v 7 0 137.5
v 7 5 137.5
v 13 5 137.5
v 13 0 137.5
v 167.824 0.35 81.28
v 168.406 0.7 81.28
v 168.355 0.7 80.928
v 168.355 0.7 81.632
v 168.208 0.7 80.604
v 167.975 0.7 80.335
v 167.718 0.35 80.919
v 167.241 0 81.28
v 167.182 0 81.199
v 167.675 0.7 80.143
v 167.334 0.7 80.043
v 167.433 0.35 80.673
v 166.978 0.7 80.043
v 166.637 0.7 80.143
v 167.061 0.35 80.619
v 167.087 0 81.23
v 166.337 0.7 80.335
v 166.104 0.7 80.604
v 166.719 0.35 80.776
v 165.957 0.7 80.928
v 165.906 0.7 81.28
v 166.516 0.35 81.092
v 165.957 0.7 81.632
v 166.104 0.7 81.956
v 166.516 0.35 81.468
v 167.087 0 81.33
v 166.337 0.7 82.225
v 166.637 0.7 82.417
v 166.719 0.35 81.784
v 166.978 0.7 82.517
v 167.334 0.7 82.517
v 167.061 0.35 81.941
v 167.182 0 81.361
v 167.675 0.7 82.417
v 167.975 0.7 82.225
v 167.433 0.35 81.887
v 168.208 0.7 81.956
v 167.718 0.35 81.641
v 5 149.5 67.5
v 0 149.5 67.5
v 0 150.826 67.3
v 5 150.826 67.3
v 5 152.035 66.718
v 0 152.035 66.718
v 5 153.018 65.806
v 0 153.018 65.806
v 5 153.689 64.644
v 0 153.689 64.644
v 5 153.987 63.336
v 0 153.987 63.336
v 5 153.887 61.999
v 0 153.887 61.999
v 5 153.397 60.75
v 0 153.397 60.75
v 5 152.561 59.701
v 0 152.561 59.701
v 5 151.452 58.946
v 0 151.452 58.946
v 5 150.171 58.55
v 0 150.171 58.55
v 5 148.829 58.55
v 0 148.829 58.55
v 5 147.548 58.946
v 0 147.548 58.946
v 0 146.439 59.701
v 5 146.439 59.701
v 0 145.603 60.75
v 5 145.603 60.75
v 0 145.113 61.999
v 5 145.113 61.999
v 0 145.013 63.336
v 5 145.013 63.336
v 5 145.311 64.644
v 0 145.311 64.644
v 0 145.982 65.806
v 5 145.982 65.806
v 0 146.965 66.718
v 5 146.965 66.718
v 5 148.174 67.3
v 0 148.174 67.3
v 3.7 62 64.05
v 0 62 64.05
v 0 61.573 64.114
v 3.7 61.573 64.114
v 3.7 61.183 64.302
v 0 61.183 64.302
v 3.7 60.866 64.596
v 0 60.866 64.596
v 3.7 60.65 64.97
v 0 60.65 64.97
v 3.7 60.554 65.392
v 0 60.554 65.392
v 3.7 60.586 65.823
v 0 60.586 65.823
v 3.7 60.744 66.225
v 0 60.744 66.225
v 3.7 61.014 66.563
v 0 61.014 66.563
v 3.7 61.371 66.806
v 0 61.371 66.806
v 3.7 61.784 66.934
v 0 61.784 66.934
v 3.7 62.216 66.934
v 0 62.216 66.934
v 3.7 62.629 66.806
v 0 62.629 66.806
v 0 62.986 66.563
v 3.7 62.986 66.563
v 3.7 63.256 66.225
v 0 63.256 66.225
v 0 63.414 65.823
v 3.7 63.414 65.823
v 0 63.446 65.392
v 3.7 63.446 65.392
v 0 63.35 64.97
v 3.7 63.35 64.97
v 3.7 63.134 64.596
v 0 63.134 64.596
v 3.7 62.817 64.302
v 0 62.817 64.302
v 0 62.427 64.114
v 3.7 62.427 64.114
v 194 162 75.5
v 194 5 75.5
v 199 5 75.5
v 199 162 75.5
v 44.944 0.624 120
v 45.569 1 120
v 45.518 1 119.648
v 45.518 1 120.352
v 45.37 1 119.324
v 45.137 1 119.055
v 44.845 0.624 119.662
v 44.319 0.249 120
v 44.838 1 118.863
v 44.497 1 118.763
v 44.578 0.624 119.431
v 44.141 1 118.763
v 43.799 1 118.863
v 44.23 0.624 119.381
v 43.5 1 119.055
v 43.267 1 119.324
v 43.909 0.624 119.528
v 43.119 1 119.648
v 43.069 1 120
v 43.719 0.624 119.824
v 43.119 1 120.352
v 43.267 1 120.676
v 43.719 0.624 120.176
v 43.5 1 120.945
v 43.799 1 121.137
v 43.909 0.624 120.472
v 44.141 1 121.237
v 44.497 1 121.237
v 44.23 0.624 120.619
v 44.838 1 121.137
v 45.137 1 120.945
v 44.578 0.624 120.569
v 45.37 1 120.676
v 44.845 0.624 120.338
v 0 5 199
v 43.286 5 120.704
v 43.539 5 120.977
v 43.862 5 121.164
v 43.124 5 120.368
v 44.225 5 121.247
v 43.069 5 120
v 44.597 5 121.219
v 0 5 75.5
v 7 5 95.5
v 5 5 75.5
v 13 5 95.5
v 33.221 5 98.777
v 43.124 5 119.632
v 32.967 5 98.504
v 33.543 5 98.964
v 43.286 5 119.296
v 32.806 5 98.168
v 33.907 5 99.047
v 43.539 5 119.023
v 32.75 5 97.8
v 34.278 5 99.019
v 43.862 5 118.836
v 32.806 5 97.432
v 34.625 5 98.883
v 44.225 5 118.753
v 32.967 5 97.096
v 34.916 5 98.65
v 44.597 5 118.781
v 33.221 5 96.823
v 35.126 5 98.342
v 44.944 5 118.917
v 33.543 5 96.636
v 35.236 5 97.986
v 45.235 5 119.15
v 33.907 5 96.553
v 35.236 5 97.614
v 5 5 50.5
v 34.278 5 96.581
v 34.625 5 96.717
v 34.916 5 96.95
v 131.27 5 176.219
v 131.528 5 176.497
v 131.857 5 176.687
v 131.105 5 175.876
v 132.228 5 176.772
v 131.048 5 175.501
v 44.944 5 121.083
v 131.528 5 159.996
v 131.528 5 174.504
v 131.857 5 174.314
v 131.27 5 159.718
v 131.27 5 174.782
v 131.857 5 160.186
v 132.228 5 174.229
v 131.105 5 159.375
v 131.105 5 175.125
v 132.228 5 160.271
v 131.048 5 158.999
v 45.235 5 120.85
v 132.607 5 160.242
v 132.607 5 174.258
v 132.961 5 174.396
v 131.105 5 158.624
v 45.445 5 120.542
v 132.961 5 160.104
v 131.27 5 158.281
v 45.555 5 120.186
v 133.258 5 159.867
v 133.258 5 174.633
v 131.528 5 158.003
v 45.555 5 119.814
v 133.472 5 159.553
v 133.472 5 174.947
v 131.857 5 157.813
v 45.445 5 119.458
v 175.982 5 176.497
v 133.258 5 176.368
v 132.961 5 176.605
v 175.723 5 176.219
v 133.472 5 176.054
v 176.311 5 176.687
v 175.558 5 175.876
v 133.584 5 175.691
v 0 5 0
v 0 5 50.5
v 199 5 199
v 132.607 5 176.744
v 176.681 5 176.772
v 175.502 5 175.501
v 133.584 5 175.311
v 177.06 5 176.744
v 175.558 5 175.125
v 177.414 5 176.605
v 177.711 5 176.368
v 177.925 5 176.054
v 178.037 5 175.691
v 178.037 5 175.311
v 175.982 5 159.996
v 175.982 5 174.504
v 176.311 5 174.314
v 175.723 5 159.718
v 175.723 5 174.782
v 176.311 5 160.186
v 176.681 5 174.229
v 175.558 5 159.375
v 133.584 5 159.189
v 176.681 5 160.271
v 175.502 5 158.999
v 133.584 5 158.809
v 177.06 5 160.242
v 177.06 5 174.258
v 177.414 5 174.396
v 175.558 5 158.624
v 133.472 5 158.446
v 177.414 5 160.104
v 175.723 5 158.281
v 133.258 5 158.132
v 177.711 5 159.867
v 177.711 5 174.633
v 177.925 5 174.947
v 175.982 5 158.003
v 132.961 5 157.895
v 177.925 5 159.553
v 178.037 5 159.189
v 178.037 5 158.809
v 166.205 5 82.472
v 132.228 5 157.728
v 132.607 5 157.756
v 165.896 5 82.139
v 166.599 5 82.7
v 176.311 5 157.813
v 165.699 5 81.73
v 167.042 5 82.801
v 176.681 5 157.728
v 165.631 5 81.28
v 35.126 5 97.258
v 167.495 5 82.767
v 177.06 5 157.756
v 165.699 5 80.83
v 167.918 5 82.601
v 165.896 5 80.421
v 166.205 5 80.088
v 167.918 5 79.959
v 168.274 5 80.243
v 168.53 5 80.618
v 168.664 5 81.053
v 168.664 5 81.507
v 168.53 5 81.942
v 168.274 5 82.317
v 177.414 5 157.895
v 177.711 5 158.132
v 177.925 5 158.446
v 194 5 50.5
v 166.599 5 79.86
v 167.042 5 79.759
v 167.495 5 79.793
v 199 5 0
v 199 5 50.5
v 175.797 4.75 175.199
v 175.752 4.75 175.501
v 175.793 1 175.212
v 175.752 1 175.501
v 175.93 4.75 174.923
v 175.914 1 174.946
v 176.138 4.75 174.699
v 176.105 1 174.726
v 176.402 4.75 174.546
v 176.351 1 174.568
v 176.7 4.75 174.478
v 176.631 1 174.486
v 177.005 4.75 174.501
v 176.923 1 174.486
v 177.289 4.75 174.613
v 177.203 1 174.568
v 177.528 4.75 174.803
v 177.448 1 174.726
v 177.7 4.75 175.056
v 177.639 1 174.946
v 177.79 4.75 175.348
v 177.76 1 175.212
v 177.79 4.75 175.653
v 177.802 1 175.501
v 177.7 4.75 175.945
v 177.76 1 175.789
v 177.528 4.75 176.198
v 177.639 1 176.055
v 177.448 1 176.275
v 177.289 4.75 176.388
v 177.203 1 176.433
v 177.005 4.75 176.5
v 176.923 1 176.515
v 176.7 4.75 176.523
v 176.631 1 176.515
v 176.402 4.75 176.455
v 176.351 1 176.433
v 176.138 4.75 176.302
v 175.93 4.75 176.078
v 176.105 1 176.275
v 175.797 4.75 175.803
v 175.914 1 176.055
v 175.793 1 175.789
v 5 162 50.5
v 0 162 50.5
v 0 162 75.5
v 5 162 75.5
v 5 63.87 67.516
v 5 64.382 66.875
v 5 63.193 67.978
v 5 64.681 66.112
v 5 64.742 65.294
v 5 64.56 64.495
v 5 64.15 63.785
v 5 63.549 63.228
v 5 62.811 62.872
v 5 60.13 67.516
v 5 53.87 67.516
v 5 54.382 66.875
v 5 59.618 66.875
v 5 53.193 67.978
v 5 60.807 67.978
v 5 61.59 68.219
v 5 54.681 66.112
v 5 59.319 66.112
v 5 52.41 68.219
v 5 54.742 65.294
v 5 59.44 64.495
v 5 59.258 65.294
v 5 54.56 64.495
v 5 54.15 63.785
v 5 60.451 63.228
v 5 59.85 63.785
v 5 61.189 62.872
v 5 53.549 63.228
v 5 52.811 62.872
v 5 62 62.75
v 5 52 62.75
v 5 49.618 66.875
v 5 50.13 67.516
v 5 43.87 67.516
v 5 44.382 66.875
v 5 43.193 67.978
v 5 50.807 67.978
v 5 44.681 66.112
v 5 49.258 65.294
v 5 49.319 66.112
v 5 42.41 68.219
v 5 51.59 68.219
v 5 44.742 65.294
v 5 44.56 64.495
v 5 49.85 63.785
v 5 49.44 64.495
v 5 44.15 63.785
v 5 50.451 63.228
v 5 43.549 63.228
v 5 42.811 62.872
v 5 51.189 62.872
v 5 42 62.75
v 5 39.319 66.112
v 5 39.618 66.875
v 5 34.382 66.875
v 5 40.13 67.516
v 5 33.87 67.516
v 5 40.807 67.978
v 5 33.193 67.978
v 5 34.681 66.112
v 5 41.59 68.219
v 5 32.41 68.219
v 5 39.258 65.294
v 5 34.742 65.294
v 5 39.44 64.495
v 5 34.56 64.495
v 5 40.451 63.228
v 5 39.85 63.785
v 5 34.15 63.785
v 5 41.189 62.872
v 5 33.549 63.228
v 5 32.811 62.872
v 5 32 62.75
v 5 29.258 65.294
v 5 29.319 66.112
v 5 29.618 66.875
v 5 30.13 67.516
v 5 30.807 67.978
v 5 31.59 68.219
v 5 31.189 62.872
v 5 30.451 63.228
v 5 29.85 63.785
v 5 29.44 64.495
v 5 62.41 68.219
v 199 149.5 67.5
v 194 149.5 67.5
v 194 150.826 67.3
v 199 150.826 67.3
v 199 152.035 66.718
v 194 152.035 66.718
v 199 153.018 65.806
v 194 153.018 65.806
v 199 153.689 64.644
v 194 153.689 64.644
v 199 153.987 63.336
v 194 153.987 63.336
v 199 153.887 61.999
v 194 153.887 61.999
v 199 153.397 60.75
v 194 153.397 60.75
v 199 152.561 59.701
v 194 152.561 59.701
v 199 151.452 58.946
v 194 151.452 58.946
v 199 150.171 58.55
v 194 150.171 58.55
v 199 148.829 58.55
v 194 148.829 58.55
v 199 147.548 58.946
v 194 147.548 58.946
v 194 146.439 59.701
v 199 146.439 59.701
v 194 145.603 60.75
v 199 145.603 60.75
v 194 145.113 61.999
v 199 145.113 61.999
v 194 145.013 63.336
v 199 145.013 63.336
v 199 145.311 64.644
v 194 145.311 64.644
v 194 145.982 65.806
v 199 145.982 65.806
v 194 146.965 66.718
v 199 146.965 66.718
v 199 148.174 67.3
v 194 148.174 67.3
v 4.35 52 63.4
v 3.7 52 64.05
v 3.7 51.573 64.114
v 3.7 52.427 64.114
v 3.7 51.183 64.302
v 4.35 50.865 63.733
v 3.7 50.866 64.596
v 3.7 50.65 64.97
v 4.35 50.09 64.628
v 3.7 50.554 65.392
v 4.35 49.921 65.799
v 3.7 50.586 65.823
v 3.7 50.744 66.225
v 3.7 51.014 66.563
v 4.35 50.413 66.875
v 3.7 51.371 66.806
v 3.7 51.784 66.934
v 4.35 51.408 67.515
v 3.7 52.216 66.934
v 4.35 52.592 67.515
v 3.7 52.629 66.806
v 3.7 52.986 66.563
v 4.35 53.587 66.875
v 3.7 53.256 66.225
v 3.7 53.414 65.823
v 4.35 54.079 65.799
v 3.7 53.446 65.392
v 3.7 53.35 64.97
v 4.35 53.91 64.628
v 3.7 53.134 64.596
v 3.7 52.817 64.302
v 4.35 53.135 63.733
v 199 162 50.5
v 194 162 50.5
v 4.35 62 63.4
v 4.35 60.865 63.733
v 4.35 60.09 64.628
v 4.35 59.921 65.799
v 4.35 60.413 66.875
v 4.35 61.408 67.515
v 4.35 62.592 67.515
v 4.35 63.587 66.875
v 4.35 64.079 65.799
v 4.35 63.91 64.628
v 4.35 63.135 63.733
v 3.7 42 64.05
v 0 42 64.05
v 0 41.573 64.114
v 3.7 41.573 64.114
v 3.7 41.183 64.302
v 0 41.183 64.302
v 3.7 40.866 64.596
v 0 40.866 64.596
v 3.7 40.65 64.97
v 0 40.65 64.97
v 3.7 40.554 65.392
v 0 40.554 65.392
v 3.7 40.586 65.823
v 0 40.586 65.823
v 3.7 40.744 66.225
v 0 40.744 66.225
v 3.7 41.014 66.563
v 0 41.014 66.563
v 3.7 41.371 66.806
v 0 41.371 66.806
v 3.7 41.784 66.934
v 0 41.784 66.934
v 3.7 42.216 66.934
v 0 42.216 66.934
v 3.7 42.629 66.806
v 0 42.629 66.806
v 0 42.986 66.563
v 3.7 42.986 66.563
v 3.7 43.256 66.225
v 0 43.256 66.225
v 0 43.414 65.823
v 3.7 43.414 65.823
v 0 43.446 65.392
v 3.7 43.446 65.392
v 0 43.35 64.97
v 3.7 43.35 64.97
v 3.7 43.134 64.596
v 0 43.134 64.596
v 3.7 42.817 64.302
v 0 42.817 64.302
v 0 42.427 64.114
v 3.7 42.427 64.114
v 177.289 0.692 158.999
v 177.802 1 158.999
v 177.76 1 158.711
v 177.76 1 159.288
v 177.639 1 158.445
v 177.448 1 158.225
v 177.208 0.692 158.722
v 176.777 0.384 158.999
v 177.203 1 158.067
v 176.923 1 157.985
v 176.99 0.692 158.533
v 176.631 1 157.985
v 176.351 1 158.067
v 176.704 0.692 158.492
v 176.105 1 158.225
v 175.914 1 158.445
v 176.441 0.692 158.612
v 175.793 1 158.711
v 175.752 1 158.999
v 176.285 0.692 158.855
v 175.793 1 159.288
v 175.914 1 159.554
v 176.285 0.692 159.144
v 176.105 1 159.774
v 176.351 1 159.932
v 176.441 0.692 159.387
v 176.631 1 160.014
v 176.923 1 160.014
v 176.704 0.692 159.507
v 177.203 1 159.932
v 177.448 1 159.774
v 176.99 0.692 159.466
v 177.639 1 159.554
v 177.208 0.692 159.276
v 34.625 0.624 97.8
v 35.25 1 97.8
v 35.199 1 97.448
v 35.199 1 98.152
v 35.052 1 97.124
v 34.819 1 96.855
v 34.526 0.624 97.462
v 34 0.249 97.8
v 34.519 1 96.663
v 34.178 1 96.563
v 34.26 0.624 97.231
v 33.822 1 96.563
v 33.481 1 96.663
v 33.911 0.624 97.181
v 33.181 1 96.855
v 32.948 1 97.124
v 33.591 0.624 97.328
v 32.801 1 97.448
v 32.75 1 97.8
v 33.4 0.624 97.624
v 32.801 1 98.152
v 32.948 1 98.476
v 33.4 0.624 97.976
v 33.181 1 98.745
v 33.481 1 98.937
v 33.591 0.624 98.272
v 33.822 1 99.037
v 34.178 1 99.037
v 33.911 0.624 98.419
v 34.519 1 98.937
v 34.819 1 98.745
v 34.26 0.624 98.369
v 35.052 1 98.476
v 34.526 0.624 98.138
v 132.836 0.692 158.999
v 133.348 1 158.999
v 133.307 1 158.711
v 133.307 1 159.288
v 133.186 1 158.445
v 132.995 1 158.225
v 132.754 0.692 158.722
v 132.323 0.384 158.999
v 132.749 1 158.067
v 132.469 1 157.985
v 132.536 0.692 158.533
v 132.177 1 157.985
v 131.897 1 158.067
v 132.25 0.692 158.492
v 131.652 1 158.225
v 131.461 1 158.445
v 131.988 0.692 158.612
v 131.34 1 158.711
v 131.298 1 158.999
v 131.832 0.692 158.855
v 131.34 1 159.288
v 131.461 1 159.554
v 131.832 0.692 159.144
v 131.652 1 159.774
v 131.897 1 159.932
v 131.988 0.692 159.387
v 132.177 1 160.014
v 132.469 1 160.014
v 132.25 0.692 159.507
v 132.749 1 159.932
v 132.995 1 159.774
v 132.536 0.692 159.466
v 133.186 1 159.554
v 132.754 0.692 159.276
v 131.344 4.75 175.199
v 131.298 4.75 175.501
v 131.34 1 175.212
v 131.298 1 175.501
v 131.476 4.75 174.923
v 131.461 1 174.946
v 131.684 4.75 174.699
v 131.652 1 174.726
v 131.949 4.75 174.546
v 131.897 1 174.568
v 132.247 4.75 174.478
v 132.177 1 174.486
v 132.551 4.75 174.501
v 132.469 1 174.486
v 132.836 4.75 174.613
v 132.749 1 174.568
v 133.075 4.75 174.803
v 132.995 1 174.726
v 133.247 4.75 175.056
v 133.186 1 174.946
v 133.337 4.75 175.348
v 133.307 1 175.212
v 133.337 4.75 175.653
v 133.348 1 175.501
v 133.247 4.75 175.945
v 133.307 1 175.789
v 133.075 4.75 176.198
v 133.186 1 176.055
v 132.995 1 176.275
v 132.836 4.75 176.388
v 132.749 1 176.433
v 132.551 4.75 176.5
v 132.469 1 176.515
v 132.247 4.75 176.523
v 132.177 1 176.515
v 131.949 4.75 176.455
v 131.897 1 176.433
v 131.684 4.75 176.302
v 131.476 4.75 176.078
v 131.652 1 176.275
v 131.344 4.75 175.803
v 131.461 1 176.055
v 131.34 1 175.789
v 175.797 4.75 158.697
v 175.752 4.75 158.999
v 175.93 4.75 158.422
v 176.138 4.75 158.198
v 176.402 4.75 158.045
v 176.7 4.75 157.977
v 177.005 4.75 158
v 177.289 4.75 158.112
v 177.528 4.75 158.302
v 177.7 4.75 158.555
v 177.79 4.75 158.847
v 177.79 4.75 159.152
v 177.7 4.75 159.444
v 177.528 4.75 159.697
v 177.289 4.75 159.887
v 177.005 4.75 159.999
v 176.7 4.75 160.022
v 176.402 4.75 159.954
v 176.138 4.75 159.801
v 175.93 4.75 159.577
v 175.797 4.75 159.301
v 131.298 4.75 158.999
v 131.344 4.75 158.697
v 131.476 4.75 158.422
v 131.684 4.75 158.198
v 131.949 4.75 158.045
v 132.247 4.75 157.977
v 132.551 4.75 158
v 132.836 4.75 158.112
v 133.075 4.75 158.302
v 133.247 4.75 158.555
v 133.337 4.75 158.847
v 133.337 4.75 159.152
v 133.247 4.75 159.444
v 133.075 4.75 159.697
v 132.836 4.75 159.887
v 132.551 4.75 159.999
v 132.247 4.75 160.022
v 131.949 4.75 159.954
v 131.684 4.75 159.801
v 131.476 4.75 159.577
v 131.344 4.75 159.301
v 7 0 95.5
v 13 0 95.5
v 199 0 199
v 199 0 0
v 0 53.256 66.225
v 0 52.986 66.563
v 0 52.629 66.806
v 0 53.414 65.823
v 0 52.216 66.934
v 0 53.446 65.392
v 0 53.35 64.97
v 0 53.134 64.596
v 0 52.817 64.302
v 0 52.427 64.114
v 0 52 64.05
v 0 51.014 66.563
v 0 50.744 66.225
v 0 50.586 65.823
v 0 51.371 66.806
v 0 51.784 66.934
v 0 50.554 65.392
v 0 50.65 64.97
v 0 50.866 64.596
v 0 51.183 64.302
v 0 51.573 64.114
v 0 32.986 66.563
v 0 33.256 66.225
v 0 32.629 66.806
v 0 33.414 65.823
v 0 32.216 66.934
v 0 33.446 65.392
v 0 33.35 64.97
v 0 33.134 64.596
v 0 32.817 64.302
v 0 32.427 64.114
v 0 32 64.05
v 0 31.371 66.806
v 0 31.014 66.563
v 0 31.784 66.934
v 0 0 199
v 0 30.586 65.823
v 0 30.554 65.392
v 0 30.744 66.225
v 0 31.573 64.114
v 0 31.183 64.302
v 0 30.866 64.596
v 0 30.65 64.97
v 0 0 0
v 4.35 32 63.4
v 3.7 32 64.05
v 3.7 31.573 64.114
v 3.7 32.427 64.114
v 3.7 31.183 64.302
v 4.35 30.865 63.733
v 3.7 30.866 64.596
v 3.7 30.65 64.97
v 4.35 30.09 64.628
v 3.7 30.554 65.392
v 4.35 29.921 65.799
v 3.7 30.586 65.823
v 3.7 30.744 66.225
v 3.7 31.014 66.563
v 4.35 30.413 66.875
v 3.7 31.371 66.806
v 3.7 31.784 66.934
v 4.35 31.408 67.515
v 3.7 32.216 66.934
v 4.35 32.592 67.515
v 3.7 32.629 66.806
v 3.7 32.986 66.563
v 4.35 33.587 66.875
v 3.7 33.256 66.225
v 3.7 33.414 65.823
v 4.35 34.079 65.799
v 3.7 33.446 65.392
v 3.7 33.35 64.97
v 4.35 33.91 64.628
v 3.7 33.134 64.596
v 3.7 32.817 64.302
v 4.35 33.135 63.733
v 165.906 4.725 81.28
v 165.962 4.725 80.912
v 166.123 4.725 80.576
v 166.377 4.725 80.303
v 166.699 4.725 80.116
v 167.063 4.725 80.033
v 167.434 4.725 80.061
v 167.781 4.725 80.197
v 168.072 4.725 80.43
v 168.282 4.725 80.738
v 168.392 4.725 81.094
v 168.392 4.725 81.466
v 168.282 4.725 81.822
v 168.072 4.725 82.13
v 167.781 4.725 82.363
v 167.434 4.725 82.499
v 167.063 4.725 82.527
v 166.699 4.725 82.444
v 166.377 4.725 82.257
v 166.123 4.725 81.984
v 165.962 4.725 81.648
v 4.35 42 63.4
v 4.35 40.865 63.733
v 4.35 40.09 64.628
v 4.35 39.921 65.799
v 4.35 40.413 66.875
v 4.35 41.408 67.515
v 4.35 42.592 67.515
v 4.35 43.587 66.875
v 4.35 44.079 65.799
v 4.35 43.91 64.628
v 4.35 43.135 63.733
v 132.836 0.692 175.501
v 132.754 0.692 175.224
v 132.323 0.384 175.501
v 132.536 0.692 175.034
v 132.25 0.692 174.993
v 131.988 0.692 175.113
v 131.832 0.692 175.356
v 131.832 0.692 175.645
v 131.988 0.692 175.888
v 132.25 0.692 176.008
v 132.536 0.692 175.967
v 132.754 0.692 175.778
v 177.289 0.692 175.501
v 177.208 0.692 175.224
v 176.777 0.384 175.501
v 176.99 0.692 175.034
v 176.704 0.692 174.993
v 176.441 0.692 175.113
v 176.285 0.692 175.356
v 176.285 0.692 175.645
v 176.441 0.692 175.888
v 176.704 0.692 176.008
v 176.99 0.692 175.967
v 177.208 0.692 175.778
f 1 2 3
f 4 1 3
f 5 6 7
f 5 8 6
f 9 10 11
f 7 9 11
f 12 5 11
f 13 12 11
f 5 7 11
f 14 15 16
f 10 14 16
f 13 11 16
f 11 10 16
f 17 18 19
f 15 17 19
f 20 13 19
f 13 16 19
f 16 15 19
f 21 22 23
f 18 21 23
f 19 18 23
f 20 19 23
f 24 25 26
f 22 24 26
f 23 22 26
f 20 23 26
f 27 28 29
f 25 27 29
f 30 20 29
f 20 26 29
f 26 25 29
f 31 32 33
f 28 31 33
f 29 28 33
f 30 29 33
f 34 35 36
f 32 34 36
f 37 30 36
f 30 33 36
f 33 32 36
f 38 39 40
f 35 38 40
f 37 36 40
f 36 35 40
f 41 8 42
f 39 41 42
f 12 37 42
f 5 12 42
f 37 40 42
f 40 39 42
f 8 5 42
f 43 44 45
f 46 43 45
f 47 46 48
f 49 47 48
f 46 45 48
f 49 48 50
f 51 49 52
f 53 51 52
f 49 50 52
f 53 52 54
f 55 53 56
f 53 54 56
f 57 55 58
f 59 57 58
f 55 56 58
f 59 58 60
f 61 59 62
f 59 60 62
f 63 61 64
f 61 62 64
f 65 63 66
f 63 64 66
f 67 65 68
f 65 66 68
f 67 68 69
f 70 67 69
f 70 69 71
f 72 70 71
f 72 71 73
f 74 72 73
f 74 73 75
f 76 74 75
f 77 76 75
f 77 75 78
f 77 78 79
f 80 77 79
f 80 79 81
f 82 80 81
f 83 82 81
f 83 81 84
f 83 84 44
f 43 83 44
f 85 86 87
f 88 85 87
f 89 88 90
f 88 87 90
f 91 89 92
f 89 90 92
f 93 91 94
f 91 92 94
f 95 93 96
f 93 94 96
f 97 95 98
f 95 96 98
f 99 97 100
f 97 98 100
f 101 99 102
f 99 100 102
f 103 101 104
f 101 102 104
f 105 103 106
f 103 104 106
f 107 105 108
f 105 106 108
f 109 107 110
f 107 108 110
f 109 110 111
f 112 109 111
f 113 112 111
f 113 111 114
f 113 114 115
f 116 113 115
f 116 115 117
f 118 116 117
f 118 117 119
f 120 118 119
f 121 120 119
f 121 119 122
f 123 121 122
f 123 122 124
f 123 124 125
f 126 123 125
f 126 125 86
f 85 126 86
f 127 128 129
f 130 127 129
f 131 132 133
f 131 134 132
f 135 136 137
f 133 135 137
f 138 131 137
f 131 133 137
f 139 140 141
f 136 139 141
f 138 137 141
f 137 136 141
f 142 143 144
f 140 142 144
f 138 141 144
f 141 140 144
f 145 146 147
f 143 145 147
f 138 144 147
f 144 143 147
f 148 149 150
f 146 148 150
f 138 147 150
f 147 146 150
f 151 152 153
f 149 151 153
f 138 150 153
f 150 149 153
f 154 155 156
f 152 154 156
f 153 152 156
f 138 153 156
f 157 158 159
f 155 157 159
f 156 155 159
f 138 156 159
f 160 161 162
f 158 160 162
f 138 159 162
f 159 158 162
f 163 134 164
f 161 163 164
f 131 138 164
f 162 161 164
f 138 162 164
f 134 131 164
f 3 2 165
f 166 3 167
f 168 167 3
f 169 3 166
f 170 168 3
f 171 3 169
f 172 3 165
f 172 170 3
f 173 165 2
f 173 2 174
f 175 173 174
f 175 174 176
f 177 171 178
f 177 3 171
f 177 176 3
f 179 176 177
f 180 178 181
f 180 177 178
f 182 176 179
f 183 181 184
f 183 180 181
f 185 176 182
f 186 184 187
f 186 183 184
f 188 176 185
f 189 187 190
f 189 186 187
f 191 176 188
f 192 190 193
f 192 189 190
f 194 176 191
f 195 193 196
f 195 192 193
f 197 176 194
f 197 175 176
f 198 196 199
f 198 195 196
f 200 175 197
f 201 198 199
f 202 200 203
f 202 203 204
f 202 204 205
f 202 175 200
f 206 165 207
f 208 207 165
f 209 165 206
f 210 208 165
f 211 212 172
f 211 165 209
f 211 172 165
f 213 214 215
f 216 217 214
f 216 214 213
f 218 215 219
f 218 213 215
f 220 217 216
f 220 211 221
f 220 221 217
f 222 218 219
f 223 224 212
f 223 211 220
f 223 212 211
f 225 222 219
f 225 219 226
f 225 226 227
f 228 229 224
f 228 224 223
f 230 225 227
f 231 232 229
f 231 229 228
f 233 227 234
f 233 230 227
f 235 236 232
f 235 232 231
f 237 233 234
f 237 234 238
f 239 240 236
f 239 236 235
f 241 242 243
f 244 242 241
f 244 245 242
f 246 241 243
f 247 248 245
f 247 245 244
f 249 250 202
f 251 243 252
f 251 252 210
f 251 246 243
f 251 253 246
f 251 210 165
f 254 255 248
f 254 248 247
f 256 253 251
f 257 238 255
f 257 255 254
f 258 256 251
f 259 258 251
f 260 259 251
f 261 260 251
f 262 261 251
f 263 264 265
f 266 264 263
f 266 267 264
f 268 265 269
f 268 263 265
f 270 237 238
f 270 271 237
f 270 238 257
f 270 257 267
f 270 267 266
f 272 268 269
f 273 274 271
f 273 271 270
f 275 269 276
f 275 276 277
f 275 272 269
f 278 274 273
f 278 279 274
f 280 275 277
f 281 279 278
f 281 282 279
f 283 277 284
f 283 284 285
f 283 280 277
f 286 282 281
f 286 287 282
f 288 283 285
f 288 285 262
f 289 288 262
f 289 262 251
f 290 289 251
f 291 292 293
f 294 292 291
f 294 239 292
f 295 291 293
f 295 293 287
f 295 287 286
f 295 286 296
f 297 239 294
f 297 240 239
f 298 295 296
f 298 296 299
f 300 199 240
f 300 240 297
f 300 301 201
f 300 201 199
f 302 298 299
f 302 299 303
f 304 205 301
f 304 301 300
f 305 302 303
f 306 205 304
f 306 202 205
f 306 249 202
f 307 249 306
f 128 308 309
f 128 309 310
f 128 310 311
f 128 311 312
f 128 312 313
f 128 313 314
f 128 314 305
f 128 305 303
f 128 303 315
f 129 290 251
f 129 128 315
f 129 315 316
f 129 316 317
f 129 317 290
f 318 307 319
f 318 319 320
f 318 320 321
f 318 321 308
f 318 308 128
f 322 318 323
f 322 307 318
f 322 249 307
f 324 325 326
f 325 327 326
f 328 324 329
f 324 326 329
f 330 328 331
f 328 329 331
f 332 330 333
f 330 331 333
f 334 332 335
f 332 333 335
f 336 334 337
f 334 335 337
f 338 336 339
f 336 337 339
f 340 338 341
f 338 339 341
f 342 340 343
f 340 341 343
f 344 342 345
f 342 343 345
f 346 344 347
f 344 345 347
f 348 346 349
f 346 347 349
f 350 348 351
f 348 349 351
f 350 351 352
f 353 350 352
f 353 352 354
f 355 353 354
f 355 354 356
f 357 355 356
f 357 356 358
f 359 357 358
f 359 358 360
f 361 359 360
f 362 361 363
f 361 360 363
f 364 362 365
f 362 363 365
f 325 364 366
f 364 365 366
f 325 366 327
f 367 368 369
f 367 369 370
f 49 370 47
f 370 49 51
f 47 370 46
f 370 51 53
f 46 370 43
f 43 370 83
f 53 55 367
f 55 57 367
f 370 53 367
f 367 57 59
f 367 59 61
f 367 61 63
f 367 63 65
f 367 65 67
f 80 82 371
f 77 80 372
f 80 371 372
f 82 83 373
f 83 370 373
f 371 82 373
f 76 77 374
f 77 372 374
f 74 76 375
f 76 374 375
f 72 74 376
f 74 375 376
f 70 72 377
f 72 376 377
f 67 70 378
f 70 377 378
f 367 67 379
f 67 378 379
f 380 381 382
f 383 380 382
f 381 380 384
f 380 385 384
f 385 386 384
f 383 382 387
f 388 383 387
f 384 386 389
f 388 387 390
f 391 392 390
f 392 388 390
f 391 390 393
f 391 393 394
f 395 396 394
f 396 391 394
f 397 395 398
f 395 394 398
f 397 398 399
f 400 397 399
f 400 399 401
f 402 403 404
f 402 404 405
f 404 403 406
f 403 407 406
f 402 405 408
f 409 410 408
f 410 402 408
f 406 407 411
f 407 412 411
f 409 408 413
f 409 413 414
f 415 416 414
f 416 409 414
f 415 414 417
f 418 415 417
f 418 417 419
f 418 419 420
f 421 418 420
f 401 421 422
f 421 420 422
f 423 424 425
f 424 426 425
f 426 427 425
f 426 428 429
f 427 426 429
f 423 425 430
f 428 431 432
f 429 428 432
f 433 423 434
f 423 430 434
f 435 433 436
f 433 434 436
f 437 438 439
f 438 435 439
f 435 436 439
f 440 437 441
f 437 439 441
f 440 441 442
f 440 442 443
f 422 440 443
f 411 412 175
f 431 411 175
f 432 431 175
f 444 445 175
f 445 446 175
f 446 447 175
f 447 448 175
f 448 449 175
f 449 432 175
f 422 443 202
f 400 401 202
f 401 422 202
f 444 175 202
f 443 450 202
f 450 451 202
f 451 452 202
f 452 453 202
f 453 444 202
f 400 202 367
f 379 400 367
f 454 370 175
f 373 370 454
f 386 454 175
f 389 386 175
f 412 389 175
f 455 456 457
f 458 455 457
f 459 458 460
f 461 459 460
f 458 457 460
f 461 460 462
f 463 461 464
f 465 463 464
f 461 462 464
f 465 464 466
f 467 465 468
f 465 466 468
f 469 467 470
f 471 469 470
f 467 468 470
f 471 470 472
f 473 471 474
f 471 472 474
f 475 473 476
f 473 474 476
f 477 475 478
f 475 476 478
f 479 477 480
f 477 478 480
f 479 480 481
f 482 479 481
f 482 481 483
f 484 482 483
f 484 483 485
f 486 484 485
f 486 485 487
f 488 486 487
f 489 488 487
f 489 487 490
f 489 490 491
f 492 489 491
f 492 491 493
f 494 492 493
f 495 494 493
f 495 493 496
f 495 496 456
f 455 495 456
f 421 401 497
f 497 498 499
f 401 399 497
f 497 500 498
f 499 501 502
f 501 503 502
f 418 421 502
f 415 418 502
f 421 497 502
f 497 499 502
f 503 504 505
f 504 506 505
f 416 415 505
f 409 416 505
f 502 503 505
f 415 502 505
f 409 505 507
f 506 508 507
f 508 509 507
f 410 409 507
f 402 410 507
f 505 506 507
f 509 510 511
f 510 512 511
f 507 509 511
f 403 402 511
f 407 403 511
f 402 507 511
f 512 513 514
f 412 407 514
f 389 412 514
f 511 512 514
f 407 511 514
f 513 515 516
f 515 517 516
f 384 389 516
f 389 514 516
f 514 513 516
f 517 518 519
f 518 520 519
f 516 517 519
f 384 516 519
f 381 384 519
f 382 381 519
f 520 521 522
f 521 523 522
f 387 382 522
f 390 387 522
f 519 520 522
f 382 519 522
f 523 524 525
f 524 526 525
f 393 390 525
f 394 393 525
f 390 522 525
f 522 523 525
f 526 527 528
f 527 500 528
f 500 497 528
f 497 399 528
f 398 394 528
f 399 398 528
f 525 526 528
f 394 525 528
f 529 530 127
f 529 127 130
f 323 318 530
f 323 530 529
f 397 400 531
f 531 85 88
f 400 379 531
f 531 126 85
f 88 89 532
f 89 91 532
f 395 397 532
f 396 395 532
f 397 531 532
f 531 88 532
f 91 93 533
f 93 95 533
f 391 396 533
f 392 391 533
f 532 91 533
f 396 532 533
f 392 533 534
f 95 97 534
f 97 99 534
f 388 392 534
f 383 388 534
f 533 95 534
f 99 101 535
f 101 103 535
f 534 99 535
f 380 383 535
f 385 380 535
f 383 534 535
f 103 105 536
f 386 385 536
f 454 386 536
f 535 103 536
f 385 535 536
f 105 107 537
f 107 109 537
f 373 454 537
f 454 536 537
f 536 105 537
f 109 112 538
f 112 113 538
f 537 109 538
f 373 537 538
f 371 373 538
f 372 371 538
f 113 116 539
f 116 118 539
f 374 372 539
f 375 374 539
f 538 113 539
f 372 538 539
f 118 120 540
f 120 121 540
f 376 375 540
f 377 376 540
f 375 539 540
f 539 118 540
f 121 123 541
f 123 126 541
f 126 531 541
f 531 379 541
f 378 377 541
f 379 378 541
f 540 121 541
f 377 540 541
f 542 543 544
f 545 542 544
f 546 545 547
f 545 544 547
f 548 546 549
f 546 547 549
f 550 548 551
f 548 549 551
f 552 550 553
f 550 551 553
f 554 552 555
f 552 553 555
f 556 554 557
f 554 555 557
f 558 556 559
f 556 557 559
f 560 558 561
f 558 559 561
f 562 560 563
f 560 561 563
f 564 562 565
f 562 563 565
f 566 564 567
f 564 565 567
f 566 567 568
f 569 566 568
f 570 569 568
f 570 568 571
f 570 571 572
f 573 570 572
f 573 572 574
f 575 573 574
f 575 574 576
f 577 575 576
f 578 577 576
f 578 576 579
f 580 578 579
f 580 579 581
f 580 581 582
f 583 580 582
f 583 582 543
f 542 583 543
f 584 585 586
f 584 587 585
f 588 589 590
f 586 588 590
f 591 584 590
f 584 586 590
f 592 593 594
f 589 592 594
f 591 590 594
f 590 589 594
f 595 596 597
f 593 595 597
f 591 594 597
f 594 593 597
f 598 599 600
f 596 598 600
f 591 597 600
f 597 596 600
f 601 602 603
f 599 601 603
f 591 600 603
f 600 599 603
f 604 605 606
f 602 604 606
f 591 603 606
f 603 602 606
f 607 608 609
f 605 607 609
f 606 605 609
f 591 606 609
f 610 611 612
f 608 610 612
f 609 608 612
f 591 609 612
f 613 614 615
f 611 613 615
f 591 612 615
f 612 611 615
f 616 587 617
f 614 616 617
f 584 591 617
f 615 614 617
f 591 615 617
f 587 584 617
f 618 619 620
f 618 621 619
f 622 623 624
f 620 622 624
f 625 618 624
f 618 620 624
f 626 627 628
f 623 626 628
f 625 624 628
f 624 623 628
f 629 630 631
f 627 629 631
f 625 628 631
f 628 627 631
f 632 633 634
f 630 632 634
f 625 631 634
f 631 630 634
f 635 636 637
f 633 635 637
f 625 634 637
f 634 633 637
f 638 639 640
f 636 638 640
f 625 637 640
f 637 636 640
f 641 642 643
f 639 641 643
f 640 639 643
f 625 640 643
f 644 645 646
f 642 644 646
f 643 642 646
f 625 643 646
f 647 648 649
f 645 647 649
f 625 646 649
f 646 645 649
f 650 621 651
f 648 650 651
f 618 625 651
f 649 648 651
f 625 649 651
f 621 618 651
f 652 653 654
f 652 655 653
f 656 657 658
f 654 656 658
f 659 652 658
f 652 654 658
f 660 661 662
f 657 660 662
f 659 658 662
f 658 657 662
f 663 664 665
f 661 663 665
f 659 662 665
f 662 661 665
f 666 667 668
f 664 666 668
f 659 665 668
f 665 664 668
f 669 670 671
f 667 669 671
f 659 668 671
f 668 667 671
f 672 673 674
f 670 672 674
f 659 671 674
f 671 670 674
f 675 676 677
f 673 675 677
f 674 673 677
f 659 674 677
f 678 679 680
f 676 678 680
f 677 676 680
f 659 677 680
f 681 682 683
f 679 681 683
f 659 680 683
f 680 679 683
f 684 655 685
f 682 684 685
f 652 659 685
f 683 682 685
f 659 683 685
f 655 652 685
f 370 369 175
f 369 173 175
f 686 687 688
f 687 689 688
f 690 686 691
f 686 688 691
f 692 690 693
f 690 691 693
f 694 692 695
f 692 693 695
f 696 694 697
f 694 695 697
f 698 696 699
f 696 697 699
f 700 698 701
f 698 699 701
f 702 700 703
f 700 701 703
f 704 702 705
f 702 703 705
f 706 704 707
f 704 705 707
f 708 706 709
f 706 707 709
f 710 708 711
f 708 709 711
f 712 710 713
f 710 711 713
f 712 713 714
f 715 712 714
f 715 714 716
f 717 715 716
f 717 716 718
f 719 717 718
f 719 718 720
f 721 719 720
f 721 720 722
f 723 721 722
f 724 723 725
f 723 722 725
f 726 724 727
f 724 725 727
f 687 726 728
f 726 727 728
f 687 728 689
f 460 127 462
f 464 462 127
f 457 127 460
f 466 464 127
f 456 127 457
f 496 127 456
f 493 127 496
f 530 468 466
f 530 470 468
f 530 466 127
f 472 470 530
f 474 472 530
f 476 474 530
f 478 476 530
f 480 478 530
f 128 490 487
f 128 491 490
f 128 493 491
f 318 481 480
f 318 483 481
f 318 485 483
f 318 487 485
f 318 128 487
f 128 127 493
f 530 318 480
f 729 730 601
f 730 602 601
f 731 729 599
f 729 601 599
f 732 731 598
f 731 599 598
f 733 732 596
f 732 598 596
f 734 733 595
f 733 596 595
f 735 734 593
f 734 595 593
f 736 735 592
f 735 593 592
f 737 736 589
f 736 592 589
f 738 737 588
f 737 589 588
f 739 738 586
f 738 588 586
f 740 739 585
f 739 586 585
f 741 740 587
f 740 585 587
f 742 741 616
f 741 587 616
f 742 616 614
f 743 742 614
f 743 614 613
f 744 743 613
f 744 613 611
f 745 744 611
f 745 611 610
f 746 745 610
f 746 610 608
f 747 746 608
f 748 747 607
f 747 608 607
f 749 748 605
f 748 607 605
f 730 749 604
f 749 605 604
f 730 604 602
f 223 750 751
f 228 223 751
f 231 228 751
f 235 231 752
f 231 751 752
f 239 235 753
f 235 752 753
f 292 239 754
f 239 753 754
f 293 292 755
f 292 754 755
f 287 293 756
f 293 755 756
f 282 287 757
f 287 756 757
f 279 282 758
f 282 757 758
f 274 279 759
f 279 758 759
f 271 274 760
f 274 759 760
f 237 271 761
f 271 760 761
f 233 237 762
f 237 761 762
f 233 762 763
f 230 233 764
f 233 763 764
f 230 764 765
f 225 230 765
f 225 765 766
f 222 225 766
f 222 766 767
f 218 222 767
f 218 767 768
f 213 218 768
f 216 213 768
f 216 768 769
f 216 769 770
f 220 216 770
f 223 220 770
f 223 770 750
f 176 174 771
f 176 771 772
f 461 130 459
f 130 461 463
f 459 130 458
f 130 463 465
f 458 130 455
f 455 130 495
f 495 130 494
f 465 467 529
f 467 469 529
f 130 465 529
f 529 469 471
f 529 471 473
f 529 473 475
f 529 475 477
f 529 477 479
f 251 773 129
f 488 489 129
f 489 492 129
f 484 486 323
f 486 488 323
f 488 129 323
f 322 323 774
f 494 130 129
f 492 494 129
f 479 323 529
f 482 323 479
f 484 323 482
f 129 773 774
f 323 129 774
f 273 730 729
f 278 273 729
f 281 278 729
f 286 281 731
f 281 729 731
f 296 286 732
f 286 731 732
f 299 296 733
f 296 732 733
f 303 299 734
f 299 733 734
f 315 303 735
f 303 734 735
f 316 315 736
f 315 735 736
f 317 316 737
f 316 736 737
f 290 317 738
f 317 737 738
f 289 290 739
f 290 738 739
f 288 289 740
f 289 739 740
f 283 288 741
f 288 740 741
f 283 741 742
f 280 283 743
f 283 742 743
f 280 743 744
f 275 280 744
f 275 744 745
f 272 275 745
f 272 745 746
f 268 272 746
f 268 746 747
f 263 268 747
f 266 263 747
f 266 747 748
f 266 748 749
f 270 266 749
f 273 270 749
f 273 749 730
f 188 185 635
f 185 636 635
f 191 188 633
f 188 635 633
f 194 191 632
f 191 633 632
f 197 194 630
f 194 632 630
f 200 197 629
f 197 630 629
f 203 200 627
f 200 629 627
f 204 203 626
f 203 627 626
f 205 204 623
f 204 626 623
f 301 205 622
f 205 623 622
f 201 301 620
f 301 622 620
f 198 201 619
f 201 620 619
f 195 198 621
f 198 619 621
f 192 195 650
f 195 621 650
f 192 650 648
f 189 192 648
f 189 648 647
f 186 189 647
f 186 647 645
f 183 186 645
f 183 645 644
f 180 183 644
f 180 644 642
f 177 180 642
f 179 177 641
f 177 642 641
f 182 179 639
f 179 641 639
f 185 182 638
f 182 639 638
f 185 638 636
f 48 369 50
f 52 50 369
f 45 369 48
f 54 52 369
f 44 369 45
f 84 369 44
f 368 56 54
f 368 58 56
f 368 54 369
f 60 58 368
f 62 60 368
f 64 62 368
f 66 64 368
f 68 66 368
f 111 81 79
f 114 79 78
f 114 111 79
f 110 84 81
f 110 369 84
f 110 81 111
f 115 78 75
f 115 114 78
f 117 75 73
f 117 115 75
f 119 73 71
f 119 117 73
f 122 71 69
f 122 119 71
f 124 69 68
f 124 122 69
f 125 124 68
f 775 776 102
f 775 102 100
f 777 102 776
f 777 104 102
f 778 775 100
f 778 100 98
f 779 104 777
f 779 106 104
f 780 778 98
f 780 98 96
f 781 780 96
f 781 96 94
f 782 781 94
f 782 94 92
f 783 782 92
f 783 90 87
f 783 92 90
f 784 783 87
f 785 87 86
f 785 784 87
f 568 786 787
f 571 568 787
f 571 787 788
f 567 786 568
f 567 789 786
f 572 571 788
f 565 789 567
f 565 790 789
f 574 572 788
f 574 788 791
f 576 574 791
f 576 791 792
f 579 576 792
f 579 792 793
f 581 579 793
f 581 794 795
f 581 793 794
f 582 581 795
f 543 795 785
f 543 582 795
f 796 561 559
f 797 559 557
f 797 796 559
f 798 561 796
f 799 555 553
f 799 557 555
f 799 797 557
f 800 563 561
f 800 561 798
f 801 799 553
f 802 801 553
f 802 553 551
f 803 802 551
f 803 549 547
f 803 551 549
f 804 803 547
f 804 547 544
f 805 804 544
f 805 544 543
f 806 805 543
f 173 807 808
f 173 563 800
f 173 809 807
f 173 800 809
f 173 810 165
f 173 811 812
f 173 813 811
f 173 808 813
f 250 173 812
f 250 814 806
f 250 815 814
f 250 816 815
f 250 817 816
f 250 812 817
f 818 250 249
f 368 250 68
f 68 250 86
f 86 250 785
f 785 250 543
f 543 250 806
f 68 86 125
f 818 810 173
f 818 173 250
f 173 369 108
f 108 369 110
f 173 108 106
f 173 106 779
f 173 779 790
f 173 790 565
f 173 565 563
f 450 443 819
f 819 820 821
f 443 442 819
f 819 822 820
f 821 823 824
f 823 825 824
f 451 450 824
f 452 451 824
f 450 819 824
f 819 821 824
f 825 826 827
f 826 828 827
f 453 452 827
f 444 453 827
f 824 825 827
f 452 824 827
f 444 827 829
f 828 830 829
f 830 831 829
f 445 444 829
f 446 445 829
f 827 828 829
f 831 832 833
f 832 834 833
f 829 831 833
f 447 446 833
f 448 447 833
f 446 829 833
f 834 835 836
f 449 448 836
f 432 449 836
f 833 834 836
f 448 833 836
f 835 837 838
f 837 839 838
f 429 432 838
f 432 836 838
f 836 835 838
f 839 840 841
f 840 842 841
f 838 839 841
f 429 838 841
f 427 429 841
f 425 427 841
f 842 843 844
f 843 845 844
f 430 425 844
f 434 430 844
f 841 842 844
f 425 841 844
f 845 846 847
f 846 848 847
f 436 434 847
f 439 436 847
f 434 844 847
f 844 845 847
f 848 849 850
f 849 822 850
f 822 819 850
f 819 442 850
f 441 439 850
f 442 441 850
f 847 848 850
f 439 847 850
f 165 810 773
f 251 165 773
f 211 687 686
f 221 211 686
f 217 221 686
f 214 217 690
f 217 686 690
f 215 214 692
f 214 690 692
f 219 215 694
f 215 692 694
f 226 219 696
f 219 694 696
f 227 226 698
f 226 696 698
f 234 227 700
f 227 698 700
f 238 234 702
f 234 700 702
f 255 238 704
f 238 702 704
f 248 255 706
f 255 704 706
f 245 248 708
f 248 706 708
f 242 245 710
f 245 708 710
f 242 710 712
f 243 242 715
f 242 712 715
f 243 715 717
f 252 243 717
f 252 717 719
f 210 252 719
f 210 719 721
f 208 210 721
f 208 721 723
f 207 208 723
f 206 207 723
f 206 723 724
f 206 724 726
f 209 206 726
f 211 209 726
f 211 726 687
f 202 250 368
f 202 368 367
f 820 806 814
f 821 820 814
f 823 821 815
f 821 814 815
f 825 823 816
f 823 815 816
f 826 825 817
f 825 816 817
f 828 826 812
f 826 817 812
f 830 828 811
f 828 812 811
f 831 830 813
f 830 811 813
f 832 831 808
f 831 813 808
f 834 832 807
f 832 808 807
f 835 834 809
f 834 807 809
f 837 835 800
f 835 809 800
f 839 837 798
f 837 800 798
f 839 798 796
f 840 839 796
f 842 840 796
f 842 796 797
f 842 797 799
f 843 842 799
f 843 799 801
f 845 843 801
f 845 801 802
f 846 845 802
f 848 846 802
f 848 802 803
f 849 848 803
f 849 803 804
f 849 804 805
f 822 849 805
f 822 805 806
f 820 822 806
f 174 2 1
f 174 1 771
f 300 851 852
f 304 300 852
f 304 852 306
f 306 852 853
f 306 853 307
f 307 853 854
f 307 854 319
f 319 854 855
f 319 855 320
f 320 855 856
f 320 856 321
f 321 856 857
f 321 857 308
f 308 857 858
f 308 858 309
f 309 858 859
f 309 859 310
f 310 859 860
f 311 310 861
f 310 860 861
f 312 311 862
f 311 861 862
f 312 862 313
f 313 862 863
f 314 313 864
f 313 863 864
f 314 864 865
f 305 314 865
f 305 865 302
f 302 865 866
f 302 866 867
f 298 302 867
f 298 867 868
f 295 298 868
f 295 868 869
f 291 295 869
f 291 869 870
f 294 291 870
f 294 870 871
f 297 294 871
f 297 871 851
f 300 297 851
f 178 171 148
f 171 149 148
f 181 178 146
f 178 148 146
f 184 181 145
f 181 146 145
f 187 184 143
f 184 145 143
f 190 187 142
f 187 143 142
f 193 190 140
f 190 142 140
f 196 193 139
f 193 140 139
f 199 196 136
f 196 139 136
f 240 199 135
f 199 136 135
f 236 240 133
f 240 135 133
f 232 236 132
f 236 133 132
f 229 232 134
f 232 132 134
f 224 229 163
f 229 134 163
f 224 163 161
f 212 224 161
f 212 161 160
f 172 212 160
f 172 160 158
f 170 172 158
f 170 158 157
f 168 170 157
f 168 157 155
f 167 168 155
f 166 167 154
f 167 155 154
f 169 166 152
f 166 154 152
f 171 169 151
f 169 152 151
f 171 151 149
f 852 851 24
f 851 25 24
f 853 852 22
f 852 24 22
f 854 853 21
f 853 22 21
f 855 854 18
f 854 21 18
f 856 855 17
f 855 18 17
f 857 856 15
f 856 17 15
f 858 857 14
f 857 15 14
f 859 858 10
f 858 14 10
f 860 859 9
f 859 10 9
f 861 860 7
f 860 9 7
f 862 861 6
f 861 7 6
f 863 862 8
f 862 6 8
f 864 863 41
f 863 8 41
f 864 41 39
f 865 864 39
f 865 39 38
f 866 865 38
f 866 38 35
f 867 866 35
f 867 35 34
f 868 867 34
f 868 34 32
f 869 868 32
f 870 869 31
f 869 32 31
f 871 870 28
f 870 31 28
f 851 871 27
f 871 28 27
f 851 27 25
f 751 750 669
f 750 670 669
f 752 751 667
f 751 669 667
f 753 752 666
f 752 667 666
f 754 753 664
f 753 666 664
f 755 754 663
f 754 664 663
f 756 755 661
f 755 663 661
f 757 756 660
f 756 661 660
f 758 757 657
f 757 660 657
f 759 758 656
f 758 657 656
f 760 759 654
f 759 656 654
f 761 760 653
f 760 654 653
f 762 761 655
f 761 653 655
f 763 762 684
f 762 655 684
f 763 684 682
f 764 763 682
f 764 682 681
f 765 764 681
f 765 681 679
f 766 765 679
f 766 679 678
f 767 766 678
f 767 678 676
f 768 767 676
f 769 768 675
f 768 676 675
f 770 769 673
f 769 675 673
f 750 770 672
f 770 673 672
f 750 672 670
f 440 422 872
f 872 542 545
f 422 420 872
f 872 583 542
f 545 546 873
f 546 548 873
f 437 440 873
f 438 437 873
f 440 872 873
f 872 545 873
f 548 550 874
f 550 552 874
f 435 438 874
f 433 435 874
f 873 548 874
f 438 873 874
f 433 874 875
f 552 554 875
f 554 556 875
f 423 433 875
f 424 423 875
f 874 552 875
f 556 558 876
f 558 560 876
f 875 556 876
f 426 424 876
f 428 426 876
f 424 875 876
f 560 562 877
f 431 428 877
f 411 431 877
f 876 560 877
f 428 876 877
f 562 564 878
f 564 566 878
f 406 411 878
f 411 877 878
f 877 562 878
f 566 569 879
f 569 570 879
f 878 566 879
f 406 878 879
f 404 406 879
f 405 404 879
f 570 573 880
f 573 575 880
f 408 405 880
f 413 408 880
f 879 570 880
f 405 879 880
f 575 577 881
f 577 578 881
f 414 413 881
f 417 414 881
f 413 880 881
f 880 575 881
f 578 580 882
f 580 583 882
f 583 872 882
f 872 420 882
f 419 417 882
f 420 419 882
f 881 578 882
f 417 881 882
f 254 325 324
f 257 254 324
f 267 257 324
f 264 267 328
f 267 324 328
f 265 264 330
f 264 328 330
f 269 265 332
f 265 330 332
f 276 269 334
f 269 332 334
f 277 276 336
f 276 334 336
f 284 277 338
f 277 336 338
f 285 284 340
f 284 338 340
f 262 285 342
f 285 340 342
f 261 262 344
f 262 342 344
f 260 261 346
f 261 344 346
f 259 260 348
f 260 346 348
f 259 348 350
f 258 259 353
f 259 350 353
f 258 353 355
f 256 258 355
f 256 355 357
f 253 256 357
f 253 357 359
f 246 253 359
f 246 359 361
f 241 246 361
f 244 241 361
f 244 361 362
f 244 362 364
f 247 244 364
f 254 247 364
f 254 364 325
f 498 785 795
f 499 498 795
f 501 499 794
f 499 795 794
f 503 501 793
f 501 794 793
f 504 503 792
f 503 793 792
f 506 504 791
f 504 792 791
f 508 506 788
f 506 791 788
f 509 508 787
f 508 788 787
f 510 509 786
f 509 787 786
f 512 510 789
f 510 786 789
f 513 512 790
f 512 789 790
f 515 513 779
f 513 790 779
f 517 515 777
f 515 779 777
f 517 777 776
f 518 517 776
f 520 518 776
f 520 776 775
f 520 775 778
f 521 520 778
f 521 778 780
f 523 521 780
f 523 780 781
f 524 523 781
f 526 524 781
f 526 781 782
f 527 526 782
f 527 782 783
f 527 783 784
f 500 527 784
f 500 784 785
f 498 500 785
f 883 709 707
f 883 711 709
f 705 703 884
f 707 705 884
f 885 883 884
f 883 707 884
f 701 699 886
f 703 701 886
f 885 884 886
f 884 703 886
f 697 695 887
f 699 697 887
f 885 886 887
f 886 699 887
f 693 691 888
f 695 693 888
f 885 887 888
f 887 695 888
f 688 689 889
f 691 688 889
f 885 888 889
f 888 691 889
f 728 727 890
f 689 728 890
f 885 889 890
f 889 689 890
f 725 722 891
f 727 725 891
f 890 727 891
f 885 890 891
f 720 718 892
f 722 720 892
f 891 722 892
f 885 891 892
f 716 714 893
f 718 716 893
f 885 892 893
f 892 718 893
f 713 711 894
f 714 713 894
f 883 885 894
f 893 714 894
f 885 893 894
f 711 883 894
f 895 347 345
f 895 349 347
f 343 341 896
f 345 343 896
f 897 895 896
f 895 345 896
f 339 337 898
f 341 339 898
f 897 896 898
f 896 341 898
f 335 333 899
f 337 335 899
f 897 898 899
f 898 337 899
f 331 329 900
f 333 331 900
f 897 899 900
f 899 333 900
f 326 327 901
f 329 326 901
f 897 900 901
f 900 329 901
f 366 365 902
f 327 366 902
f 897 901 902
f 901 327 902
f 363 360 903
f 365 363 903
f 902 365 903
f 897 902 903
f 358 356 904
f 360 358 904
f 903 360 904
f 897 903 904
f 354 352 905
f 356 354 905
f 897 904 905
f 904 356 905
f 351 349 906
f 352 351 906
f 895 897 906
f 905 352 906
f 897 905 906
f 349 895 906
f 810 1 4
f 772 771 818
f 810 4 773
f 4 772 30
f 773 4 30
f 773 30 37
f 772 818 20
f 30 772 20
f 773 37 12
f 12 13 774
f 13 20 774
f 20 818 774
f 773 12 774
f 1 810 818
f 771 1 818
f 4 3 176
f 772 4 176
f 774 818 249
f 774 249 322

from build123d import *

# Parameters (mm, degrees)
SKETCH1_W                                         = 199
SKETCH1_H                                         = 199
BOSS_EXTRUDE1_DEPTH                               = 5
SKETCH2_W                                         = 5
SKETCH2_H                                         = 25
BOSS_EXTRUDE2_DEPTH                               = 18.8
SKETCH3_W                                         = 5
SKETCH3_H                                         = 25
BOSS_EXTRUDE3_DEPTH                               = 46.4
SKETCH4_W                                         = 5
SKETCH4_H                                         = 25
BOSS_EXTRUDE4_DEPTH                               = 91.8
SKETCH5_W                                         = 5
SKETCH5_H                                         = 25
BOSS_EXTRUDE5_DEPTH                               = 157
SKETCH6_R                                         = 4.5
CUT_EXTRUDE1_DEPTH                                = 325.724498614
SKETCH12_W                                        = 6
SKETCH12_H                                        = 42
CUT_EXTRUDE3_DEPTH                                = 5
M3X0_5_TAPPED_HOLE1_D                             = 2.5
M3X0_5_TAPPED_HOLE1_DEPTH                         = 4
M3X0_5_TAPPED_HOLE1_TIP                           = 0.751075774
CSK_FOR_M2_5_FLAT_HEAD_MACHINE_SCREW1_D           = 2.9
CSK_FOR_M2_5_FLAT_HEAD_MACHINE_SCREW1_DEPTH       = 5
CSK_FOR_M2_5_FLAT_HEAD_MACHINE_SCREW1_CSINK_D     = 5.5
CSK_FOR_M2_5_FLAT_HEAD_MACHINE_SCREW1_CSINK_ANGLE = 90
M2_5X0_45_TAPPED_HOLE1_D                          = 2.05
M2_5X0_45_TAPPED_HOLE1_DEPTH                      = 4
M2_5X0_45_TAPPED_HOLE1_CSINK_D                    = 2.55
M2_5X0_45_TAPPED_HOLE1_CSINK_ANGLE                = 90
M2_5X0_45_TAPPED_HOLE1_TIP                        = 0.615882135
M3X0_5_TAPPED_HOLE2_D                             = 2.5
M3X0_5_TAPPED_HOLE2_DEPTH                         = 4.3
M3X0_5_TAPPED_HOLE2_CSINK_D                       = 3.05
M3X0_5_TAPPED_HOLE2_CSINK_ANGLE                   = 90
M3X0_5_TAPPED_HOLE2_TIP                           = 0.751075774


with BuildPart() as part:
    # Sketch1 → Boss-Extrude1 (new body)
    with BuildSketch(Plane(origin=(0, 0, 0), x_dir=(1, 0, 0), z_dir=(0, 1, 0))):
        with Locations((99.5, -99.5)):
            Rectangle(SKETCH1_W, SKETCH1_H)
    extrude(amount=BOSS_EXTRUDE1_DEPTH)

    # Sketch2 → Boss-Extrude2 (add)
    with BuildSketch(Plane(origin=(0, 5, 0), x_dir=(1, 0, 0), z_dir=(0, 1, 0))):
        with Locations((2.5, -63)):
            Rectangle(SKETCH2_W, SKETCH2_H)
    extrude(amount=BOSS_EXTRUDE2_DEPTH)

    # Sketch3 → Boss-Extrude3 (add)
    with BuildSketch(Plane(origin=(0, 23.8, 0), x_dir=(1, 0, 0), z_dir=(0, 1, 0))):
        with Locations((2.5, -63)):
            Rectangle(SKETCH3_W, SKETCH3_H)
    extrude(amount=BOSS_EXTRUDE3_DEPTH)

    # Sketch4 → Boss-Extrude4 (add)
    with BuildSketch(Plane(origin=(0, 70.2, 0), x_dir=(1, 0, 0), z_dir=(0, 1, 0))):
        with Locations((2.5, -63)):
            Rectangle(SKETCH4_W, SKETCH4_H)
    extrude(amount=BOSS_EXTRUDE4_DEPTH)

    # Sketch5 → Boss-Extrude5 (add)
    with BuildSketch(Plane(origin=(0, 5, 0), x_dir=(1, 0, 0), z_dir=(0, 1, 0))):
        with Locations((196.5, -63)):
            Rectangle(SKETCH5_W, SKETCH5_H)
    extrude(amount=BOSS_EXTRUDE5_DEPTH)

    # Sketch6 → Cut-Extrude1 (cut, through all)
    with BuildSketch(Plane.ZY):
        with Locations((63, 149.5)):
            Circle(SKETCH6_R)
    extrude(amount=-CUT_EXTRUDE1_DEPTH, mode=Mode.SUBTRACT)

    # Sketch12 → Cut-Extrude3 (cut)
    with BuildSketch(Plane(origin=(0, 5, 0), x_dir=(1, 0, 0), z_dir=(0, 1, 0))):
        with Locations((10, -116.5)):
            Rectangle(SKETCH12_W, SKETCH12_H)
    extrude(amount=-CUT_EXTRUDE3_DEPTH, mode=Mode.SUBTRACT)

    # M3x0.5 Tapped Hole1
    with Locations(Plane(origin=(0, 5, 0), x_dir=(1, 0, 0), z_dir=(0, 1, 0))):
        with Locations((34, -97.8), (44.31875, -120)):
            Hole(M3X0_5_TAPPED_HOLE1_D / 2, depth=M3X0_5_TAPPED_HOLE1_DEPTH)
            with Locations((0, 0, -(M3X0_5_TAPPED_HOLE1_DEPTH + M3X0_5_TAPPED_HOLE1_TIP / 2))):  # 118° drill point
                Cone(0, M3X0_5_TAPPED_HOLE1_D / 2, M3X0_5_TAPPED_HOLE1_TIP, mode=Mode.SUBTRACT)

    # CSK for M2.5 Flat Head Machine Screw1
    with Locations(Plane(origin=(5, 62, 65.5), x_dir=(0, 0, 1), z_dir=(1, 0, 0))):
        with Locations((0, 0), (0, 10), (0, 20), (0, 30)):
            CounterSinkHole(CSK_FOR_M2_5_FLAT_HEAD_MACHINE_SCREW1_D / 2, CSK_FOR_M2_5_FLAT_HEAD_MACHINE_SCREW1_CSINK_D / 2, depth=CSK_FOR_M2_5_FLAT_HEAD_MACHINE_SCREW1_DEPTH, counter_sink_angle=CSK_FOR_M2_5_FLAT_HEAD_MACHINE_SCREW1_CSINK_ANGLE)

    # M2.5x0.45 Tapped Hole1
    with Locations(Plane(origin=(0, 5, 0), x_dir=(1, 0, 0), z_dir=(0, 1, 0))):
        with Locations((132.323297508, -175.500631971), (132.323297508, -158.999368029), (176.776702492, -158.999368029), (176.776702492, -175.500631971)):
            CounterSinkHole(M2_5X0_45_TAPPED_HOLE1_D / 2, M2_5X0_45_TAPPED_HOLE1_CSINK_D / 2, depth=M2_5X0_45_TAPPED_HOLE1_DEPTH, counter_sink_angle=M2_5X0_45_TAPPED_HOLE1_CSINK_ANGLE)
            with Locations((0, 0, -(M2_5X0_45_TAPPED_HOLE1_DEPTH + M2_5X0_45_TAPPED_HOLE1_TIP / 2))):  # 118° drill point
                Cone(0, M2_5X0_45_TAPPED_HOLE1_D / 2, M2_5X0_45_TAPPED_HOLE1_TIP, mode=Mode.SUBTRACT)

    # M3x0.5 Tapped Hole2
    with Locations(Plane(origin=(0, 5, 0), x_dir=(1, 0, 0), z_dir=(0, 1, 0))):
        with Locations((167.156, -81.28)):
            CounterSinkHole(M3X0_5_TAPPED_HOLE2_D / 2, M3X0_5_TAPPED_HOLE2_CSINK_D / 2, depth=M3X0_5_TAPPED_HOLE2_DEPTH, counter_sink_angle=M3X0_5_TAPPED_HOLE2_CSINK_ANGLE)
            with Locations((0, 0, -(M3X0_5_TAPPED_HOLE2_DEPTH + M3X0_5_TAPPED_HOLE2_TIP / 2))):  # 118° drill point
                Cone(0, M3X0_5_TAPPED_HOLE2_D / 2, M3X0_5_TAPPED_HOLE2_TIP, mode=Mode.SUBTRACT)


solid = part.part
